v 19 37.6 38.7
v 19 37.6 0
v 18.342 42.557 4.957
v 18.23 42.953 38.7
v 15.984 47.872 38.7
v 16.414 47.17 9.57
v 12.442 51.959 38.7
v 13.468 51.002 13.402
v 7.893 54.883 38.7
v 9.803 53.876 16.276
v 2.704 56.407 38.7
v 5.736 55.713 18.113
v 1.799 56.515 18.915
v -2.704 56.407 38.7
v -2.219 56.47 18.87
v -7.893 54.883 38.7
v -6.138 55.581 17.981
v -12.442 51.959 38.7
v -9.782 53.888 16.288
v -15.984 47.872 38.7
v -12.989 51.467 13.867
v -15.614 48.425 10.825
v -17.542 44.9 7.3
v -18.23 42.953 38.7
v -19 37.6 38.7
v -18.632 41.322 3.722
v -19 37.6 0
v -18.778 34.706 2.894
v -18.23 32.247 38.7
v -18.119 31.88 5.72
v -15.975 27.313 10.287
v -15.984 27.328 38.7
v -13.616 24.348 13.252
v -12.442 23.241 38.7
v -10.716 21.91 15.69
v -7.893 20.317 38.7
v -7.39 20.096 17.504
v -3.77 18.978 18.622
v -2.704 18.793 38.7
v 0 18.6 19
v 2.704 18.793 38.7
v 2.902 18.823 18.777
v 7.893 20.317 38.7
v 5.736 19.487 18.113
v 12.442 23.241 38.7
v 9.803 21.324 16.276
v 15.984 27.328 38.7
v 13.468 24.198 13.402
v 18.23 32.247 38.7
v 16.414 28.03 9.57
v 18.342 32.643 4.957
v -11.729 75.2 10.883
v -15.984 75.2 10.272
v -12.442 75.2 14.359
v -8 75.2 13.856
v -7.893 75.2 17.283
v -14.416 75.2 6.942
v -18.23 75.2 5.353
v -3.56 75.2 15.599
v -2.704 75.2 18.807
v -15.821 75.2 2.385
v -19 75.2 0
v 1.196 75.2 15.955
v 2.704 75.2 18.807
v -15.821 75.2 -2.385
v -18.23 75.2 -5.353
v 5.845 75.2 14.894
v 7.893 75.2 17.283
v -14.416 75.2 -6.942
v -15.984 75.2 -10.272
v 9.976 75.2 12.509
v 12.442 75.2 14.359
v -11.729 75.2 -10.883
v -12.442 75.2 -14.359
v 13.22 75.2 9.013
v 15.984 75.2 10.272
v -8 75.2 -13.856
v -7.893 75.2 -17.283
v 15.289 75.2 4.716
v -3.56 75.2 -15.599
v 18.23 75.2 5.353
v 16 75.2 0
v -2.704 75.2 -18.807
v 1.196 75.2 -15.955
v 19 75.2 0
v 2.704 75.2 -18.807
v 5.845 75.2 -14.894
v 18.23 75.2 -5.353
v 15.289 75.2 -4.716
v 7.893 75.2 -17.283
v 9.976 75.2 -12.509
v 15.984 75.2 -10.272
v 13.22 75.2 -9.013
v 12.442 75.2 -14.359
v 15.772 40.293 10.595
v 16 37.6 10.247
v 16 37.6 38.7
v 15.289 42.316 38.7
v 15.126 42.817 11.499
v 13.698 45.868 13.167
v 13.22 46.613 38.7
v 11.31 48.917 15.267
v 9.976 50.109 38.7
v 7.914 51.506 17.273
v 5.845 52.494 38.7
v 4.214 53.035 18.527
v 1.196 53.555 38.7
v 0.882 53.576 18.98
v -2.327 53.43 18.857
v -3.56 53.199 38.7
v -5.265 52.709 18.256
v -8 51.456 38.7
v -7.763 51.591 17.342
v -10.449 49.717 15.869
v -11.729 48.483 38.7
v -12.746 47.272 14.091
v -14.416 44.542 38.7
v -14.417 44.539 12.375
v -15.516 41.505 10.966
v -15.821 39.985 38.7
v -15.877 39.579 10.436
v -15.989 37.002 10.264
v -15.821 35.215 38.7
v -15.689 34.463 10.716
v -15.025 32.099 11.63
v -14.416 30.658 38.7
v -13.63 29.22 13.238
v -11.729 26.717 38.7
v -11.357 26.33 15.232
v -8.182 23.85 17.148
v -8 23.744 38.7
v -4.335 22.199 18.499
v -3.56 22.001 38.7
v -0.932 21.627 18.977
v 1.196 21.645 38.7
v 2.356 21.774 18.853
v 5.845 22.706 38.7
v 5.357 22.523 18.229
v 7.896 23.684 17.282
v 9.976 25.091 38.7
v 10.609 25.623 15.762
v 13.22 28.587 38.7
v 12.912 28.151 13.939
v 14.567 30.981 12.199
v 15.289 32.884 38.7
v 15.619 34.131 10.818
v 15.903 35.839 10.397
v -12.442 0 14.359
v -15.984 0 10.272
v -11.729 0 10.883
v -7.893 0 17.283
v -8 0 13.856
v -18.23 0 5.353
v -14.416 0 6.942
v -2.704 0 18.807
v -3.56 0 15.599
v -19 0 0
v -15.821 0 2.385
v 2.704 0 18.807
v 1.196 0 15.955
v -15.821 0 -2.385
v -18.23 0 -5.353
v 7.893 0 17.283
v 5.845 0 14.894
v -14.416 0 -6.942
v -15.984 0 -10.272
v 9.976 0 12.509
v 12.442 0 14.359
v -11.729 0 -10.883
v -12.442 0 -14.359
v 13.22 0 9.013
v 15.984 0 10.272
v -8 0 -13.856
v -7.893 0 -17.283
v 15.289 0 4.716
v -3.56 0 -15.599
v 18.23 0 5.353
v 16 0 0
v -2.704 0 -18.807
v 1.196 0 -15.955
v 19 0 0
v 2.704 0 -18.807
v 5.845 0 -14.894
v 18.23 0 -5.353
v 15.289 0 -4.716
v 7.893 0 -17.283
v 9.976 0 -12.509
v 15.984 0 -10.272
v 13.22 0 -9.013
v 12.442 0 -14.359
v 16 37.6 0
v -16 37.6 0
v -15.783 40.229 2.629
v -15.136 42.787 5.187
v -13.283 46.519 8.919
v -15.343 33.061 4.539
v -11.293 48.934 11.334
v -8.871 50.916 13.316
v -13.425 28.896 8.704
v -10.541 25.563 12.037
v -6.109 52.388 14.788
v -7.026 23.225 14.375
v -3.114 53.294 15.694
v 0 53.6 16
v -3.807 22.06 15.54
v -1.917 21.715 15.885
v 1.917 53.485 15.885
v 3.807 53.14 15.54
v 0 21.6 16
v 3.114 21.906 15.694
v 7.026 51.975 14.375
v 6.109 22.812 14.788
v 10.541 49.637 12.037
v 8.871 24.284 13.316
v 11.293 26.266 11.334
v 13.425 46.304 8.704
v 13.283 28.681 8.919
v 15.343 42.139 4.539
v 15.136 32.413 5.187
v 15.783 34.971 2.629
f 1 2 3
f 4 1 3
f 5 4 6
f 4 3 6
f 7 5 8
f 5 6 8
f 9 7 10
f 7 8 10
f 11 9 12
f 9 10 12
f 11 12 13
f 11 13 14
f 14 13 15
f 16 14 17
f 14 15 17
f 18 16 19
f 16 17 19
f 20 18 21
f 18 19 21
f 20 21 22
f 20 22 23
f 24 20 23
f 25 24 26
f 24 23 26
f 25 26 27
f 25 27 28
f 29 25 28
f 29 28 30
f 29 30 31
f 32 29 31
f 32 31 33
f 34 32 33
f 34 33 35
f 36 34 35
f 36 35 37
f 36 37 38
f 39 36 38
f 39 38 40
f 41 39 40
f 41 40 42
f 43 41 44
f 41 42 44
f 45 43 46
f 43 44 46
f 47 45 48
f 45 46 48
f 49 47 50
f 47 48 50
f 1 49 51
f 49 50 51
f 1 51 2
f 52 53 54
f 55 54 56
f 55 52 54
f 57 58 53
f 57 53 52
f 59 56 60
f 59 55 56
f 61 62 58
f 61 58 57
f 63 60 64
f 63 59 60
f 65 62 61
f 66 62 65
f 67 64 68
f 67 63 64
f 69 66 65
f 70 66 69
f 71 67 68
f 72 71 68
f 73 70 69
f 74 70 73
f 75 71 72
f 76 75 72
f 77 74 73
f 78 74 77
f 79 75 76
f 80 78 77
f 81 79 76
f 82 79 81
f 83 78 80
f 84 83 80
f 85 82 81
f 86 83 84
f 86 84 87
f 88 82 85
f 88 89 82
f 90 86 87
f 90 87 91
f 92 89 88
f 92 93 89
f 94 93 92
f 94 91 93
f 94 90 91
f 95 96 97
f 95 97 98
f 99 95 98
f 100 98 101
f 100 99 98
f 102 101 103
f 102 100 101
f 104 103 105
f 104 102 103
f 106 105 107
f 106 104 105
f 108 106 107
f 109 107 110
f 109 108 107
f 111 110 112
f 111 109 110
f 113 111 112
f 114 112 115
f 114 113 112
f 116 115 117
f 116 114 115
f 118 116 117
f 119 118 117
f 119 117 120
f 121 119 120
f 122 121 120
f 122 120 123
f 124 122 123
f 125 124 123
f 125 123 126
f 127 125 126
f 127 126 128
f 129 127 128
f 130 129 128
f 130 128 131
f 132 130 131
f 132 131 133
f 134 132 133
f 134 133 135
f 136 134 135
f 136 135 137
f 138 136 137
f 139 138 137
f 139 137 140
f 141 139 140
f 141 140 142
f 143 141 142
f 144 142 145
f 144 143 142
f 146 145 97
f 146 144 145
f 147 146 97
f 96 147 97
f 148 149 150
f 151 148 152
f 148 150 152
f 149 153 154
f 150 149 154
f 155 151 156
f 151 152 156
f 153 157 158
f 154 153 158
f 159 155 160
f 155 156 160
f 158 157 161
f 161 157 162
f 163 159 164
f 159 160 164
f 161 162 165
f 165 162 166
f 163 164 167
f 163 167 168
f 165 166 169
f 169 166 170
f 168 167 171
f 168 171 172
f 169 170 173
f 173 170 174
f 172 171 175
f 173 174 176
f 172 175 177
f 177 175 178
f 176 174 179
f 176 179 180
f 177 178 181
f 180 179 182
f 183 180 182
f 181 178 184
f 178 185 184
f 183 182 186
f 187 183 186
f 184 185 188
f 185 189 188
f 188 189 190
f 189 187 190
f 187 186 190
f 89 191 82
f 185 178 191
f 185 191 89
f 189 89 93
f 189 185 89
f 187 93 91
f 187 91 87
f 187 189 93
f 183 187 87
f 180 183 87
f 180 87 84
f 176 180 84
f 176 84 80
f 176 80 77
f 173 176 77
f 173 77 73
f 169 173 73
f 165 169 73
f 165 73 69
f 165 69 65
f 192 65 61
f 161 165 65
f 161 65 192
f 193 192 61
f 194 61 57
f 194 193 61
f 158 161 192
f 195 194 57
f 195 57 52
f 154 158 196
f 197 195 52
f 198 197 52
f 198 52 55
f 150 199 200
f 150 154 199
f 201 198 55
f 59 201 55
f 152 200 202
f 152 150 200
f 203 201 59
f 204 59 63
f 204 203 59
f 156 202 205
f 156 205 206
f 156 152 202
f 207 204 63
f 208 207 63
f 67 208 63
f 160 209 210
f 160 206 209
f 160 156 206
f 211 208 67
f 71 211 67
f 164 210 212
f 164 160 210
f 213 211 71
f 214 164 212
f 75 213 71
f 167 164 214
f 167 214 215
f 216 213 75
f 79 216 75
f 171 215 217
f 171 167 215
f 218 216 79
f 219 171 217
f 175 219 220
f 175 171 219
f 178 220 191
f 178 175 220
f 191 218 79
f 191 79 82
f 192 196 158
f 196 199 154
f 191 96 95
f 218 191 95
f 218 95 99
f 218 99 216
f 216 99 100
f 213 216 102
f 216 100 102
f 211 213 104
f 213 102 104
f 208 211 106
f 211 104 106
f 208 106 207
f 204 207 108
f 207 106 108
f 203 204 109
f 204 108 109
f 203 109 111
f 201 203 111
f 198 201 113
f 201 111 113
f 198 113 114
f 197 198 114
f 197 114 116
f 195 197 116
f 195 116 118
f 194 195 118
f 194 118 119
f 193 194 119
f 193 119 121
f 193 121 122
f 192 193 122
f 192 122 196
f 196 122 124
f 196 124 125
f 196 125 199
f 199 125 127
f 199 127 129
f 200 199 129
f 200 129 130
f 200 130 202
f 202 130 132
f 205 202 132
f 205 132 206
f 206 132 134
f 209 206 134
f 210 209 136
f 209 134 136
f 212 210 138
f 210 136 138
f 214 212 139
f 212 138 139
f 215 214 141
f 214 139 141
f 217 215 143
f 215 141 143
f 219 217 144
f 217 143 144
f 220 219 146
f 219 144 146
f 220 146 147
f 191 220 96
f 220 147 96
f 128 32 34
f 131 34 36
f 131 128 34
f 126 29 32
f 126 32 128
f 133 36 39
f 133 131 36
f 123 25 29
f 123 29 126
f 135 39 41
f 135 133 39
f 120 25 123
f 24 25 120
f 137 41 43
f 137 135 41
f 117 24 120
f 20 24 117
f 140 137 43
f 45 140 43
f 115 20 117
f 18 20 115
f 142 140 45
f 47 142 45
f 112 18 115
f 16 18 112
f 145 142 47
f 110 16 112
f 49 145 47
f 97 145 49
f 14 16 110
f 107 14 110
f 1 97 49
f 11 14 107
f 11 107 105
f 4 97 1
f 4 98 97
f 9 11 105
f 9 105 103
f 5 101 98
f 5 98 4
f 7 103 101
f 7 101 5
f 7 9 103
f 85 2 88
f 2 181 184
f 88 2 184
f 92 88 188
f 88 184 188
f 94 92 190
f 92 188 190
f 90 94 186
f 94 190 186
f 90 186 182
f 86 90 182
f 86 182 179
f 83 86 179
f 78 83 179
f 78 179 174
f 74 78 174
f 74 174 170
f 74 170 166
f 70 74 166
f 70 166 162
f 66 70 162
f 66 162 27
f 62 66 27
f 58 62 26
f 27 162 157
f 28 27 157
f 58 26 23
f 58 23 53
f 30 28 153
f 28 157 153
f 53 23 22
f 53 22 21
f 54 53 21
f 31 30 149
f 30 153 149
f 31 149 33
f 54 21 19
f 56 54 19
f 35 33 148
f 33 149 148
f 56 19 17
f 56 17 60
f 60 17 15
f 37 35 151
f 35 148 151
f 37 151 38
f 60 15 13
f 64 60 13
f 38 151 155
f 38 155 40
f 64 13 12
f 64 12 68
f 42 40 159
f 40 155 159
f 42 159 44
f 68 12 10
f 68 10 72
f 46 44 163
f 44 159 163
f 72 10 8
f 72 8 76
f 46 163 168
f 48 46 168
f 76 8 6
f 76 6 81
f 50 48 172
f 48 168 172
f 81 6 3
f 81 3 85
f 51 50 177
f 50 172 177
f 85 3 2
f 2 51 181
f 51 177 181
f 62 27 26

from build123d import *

# Parameters (mm, degrees)
SKETCH_1_R          = 19
SKETCH_1_R_2        = 16
EXTRUDE_1_DEPTH     = 75.2
SKETCH_2_R          = 19
SKETCH_2_R_2        = 16
EXTRUDE_2_DEPTH     = 38.7
SKETCH_3_R          = 16
CUT_EXTRUDE_1_DEPTH = 76.2000001
CUT_EXTRUDE_2_REACH = 59.7
SKETCH_4_R          = 16


with BuildPart() as part:
    # 草图1 → 凸台-拉伸1 (new body)
    with BuildSketch(Plane(origin=(0, 0, 0), x_dir=(1, 0, 0), z_dir=(0, 1, 0))):
        Circle(SKETCH_1_R)
        Circle(SKETCH_1_R_2, mode=Mode.SUBTRACT)
    extrude(amount=EXTRUDE_1_DEPTH)

    # 草图2 → 凸台-拉伸2 (add)
    with BuildSketch(Plane.XY):
        with Locations((0, 37.6)):
            Circle(SKETCH_2_R)
        with Locations((0, 37.6)):
            Circle(SKETCH_2_R_2, mode=Mode.SUBTRACT)
    extrude(amount=EXTRUDE_2_DEPTH)

    # 草图3 → 切除-拉伸1 (cut, through all)
    with BuildSketch(Plane(origin=(0, 75.2, 0), x_dir=(1, 0, 0), z_dir=(0, 1, 0))):
        Circle(SKETCH_3_R)
    extrude(amount=-CUT_EXTRUDE_1_DEPTH, mode=Mode.SUBTRACT)

    # 草图4 → 切除-拉伸2 (cut, up to next)
    with BuildSketch(Plane.XY.offset(38.7), mode=Mode.PRIVATE) as cut_extrude_2_sk1:
        with Locations((0, 37.6)):
            Circle(SKETCH_4_R)
    cut_extrude_2_tool1 = extrude(cut_extrude_2_sk1.sketch, amount=-CUT_EXTRUDE_2_REACH, mode=Mode.PRIVATE) & part.part
    add(cut_extrude_2_tool1.solids().sort_by_distance((0, 37.6, 38.7))[0], mode=Mode.SUBTRACT)


solid = part.part
